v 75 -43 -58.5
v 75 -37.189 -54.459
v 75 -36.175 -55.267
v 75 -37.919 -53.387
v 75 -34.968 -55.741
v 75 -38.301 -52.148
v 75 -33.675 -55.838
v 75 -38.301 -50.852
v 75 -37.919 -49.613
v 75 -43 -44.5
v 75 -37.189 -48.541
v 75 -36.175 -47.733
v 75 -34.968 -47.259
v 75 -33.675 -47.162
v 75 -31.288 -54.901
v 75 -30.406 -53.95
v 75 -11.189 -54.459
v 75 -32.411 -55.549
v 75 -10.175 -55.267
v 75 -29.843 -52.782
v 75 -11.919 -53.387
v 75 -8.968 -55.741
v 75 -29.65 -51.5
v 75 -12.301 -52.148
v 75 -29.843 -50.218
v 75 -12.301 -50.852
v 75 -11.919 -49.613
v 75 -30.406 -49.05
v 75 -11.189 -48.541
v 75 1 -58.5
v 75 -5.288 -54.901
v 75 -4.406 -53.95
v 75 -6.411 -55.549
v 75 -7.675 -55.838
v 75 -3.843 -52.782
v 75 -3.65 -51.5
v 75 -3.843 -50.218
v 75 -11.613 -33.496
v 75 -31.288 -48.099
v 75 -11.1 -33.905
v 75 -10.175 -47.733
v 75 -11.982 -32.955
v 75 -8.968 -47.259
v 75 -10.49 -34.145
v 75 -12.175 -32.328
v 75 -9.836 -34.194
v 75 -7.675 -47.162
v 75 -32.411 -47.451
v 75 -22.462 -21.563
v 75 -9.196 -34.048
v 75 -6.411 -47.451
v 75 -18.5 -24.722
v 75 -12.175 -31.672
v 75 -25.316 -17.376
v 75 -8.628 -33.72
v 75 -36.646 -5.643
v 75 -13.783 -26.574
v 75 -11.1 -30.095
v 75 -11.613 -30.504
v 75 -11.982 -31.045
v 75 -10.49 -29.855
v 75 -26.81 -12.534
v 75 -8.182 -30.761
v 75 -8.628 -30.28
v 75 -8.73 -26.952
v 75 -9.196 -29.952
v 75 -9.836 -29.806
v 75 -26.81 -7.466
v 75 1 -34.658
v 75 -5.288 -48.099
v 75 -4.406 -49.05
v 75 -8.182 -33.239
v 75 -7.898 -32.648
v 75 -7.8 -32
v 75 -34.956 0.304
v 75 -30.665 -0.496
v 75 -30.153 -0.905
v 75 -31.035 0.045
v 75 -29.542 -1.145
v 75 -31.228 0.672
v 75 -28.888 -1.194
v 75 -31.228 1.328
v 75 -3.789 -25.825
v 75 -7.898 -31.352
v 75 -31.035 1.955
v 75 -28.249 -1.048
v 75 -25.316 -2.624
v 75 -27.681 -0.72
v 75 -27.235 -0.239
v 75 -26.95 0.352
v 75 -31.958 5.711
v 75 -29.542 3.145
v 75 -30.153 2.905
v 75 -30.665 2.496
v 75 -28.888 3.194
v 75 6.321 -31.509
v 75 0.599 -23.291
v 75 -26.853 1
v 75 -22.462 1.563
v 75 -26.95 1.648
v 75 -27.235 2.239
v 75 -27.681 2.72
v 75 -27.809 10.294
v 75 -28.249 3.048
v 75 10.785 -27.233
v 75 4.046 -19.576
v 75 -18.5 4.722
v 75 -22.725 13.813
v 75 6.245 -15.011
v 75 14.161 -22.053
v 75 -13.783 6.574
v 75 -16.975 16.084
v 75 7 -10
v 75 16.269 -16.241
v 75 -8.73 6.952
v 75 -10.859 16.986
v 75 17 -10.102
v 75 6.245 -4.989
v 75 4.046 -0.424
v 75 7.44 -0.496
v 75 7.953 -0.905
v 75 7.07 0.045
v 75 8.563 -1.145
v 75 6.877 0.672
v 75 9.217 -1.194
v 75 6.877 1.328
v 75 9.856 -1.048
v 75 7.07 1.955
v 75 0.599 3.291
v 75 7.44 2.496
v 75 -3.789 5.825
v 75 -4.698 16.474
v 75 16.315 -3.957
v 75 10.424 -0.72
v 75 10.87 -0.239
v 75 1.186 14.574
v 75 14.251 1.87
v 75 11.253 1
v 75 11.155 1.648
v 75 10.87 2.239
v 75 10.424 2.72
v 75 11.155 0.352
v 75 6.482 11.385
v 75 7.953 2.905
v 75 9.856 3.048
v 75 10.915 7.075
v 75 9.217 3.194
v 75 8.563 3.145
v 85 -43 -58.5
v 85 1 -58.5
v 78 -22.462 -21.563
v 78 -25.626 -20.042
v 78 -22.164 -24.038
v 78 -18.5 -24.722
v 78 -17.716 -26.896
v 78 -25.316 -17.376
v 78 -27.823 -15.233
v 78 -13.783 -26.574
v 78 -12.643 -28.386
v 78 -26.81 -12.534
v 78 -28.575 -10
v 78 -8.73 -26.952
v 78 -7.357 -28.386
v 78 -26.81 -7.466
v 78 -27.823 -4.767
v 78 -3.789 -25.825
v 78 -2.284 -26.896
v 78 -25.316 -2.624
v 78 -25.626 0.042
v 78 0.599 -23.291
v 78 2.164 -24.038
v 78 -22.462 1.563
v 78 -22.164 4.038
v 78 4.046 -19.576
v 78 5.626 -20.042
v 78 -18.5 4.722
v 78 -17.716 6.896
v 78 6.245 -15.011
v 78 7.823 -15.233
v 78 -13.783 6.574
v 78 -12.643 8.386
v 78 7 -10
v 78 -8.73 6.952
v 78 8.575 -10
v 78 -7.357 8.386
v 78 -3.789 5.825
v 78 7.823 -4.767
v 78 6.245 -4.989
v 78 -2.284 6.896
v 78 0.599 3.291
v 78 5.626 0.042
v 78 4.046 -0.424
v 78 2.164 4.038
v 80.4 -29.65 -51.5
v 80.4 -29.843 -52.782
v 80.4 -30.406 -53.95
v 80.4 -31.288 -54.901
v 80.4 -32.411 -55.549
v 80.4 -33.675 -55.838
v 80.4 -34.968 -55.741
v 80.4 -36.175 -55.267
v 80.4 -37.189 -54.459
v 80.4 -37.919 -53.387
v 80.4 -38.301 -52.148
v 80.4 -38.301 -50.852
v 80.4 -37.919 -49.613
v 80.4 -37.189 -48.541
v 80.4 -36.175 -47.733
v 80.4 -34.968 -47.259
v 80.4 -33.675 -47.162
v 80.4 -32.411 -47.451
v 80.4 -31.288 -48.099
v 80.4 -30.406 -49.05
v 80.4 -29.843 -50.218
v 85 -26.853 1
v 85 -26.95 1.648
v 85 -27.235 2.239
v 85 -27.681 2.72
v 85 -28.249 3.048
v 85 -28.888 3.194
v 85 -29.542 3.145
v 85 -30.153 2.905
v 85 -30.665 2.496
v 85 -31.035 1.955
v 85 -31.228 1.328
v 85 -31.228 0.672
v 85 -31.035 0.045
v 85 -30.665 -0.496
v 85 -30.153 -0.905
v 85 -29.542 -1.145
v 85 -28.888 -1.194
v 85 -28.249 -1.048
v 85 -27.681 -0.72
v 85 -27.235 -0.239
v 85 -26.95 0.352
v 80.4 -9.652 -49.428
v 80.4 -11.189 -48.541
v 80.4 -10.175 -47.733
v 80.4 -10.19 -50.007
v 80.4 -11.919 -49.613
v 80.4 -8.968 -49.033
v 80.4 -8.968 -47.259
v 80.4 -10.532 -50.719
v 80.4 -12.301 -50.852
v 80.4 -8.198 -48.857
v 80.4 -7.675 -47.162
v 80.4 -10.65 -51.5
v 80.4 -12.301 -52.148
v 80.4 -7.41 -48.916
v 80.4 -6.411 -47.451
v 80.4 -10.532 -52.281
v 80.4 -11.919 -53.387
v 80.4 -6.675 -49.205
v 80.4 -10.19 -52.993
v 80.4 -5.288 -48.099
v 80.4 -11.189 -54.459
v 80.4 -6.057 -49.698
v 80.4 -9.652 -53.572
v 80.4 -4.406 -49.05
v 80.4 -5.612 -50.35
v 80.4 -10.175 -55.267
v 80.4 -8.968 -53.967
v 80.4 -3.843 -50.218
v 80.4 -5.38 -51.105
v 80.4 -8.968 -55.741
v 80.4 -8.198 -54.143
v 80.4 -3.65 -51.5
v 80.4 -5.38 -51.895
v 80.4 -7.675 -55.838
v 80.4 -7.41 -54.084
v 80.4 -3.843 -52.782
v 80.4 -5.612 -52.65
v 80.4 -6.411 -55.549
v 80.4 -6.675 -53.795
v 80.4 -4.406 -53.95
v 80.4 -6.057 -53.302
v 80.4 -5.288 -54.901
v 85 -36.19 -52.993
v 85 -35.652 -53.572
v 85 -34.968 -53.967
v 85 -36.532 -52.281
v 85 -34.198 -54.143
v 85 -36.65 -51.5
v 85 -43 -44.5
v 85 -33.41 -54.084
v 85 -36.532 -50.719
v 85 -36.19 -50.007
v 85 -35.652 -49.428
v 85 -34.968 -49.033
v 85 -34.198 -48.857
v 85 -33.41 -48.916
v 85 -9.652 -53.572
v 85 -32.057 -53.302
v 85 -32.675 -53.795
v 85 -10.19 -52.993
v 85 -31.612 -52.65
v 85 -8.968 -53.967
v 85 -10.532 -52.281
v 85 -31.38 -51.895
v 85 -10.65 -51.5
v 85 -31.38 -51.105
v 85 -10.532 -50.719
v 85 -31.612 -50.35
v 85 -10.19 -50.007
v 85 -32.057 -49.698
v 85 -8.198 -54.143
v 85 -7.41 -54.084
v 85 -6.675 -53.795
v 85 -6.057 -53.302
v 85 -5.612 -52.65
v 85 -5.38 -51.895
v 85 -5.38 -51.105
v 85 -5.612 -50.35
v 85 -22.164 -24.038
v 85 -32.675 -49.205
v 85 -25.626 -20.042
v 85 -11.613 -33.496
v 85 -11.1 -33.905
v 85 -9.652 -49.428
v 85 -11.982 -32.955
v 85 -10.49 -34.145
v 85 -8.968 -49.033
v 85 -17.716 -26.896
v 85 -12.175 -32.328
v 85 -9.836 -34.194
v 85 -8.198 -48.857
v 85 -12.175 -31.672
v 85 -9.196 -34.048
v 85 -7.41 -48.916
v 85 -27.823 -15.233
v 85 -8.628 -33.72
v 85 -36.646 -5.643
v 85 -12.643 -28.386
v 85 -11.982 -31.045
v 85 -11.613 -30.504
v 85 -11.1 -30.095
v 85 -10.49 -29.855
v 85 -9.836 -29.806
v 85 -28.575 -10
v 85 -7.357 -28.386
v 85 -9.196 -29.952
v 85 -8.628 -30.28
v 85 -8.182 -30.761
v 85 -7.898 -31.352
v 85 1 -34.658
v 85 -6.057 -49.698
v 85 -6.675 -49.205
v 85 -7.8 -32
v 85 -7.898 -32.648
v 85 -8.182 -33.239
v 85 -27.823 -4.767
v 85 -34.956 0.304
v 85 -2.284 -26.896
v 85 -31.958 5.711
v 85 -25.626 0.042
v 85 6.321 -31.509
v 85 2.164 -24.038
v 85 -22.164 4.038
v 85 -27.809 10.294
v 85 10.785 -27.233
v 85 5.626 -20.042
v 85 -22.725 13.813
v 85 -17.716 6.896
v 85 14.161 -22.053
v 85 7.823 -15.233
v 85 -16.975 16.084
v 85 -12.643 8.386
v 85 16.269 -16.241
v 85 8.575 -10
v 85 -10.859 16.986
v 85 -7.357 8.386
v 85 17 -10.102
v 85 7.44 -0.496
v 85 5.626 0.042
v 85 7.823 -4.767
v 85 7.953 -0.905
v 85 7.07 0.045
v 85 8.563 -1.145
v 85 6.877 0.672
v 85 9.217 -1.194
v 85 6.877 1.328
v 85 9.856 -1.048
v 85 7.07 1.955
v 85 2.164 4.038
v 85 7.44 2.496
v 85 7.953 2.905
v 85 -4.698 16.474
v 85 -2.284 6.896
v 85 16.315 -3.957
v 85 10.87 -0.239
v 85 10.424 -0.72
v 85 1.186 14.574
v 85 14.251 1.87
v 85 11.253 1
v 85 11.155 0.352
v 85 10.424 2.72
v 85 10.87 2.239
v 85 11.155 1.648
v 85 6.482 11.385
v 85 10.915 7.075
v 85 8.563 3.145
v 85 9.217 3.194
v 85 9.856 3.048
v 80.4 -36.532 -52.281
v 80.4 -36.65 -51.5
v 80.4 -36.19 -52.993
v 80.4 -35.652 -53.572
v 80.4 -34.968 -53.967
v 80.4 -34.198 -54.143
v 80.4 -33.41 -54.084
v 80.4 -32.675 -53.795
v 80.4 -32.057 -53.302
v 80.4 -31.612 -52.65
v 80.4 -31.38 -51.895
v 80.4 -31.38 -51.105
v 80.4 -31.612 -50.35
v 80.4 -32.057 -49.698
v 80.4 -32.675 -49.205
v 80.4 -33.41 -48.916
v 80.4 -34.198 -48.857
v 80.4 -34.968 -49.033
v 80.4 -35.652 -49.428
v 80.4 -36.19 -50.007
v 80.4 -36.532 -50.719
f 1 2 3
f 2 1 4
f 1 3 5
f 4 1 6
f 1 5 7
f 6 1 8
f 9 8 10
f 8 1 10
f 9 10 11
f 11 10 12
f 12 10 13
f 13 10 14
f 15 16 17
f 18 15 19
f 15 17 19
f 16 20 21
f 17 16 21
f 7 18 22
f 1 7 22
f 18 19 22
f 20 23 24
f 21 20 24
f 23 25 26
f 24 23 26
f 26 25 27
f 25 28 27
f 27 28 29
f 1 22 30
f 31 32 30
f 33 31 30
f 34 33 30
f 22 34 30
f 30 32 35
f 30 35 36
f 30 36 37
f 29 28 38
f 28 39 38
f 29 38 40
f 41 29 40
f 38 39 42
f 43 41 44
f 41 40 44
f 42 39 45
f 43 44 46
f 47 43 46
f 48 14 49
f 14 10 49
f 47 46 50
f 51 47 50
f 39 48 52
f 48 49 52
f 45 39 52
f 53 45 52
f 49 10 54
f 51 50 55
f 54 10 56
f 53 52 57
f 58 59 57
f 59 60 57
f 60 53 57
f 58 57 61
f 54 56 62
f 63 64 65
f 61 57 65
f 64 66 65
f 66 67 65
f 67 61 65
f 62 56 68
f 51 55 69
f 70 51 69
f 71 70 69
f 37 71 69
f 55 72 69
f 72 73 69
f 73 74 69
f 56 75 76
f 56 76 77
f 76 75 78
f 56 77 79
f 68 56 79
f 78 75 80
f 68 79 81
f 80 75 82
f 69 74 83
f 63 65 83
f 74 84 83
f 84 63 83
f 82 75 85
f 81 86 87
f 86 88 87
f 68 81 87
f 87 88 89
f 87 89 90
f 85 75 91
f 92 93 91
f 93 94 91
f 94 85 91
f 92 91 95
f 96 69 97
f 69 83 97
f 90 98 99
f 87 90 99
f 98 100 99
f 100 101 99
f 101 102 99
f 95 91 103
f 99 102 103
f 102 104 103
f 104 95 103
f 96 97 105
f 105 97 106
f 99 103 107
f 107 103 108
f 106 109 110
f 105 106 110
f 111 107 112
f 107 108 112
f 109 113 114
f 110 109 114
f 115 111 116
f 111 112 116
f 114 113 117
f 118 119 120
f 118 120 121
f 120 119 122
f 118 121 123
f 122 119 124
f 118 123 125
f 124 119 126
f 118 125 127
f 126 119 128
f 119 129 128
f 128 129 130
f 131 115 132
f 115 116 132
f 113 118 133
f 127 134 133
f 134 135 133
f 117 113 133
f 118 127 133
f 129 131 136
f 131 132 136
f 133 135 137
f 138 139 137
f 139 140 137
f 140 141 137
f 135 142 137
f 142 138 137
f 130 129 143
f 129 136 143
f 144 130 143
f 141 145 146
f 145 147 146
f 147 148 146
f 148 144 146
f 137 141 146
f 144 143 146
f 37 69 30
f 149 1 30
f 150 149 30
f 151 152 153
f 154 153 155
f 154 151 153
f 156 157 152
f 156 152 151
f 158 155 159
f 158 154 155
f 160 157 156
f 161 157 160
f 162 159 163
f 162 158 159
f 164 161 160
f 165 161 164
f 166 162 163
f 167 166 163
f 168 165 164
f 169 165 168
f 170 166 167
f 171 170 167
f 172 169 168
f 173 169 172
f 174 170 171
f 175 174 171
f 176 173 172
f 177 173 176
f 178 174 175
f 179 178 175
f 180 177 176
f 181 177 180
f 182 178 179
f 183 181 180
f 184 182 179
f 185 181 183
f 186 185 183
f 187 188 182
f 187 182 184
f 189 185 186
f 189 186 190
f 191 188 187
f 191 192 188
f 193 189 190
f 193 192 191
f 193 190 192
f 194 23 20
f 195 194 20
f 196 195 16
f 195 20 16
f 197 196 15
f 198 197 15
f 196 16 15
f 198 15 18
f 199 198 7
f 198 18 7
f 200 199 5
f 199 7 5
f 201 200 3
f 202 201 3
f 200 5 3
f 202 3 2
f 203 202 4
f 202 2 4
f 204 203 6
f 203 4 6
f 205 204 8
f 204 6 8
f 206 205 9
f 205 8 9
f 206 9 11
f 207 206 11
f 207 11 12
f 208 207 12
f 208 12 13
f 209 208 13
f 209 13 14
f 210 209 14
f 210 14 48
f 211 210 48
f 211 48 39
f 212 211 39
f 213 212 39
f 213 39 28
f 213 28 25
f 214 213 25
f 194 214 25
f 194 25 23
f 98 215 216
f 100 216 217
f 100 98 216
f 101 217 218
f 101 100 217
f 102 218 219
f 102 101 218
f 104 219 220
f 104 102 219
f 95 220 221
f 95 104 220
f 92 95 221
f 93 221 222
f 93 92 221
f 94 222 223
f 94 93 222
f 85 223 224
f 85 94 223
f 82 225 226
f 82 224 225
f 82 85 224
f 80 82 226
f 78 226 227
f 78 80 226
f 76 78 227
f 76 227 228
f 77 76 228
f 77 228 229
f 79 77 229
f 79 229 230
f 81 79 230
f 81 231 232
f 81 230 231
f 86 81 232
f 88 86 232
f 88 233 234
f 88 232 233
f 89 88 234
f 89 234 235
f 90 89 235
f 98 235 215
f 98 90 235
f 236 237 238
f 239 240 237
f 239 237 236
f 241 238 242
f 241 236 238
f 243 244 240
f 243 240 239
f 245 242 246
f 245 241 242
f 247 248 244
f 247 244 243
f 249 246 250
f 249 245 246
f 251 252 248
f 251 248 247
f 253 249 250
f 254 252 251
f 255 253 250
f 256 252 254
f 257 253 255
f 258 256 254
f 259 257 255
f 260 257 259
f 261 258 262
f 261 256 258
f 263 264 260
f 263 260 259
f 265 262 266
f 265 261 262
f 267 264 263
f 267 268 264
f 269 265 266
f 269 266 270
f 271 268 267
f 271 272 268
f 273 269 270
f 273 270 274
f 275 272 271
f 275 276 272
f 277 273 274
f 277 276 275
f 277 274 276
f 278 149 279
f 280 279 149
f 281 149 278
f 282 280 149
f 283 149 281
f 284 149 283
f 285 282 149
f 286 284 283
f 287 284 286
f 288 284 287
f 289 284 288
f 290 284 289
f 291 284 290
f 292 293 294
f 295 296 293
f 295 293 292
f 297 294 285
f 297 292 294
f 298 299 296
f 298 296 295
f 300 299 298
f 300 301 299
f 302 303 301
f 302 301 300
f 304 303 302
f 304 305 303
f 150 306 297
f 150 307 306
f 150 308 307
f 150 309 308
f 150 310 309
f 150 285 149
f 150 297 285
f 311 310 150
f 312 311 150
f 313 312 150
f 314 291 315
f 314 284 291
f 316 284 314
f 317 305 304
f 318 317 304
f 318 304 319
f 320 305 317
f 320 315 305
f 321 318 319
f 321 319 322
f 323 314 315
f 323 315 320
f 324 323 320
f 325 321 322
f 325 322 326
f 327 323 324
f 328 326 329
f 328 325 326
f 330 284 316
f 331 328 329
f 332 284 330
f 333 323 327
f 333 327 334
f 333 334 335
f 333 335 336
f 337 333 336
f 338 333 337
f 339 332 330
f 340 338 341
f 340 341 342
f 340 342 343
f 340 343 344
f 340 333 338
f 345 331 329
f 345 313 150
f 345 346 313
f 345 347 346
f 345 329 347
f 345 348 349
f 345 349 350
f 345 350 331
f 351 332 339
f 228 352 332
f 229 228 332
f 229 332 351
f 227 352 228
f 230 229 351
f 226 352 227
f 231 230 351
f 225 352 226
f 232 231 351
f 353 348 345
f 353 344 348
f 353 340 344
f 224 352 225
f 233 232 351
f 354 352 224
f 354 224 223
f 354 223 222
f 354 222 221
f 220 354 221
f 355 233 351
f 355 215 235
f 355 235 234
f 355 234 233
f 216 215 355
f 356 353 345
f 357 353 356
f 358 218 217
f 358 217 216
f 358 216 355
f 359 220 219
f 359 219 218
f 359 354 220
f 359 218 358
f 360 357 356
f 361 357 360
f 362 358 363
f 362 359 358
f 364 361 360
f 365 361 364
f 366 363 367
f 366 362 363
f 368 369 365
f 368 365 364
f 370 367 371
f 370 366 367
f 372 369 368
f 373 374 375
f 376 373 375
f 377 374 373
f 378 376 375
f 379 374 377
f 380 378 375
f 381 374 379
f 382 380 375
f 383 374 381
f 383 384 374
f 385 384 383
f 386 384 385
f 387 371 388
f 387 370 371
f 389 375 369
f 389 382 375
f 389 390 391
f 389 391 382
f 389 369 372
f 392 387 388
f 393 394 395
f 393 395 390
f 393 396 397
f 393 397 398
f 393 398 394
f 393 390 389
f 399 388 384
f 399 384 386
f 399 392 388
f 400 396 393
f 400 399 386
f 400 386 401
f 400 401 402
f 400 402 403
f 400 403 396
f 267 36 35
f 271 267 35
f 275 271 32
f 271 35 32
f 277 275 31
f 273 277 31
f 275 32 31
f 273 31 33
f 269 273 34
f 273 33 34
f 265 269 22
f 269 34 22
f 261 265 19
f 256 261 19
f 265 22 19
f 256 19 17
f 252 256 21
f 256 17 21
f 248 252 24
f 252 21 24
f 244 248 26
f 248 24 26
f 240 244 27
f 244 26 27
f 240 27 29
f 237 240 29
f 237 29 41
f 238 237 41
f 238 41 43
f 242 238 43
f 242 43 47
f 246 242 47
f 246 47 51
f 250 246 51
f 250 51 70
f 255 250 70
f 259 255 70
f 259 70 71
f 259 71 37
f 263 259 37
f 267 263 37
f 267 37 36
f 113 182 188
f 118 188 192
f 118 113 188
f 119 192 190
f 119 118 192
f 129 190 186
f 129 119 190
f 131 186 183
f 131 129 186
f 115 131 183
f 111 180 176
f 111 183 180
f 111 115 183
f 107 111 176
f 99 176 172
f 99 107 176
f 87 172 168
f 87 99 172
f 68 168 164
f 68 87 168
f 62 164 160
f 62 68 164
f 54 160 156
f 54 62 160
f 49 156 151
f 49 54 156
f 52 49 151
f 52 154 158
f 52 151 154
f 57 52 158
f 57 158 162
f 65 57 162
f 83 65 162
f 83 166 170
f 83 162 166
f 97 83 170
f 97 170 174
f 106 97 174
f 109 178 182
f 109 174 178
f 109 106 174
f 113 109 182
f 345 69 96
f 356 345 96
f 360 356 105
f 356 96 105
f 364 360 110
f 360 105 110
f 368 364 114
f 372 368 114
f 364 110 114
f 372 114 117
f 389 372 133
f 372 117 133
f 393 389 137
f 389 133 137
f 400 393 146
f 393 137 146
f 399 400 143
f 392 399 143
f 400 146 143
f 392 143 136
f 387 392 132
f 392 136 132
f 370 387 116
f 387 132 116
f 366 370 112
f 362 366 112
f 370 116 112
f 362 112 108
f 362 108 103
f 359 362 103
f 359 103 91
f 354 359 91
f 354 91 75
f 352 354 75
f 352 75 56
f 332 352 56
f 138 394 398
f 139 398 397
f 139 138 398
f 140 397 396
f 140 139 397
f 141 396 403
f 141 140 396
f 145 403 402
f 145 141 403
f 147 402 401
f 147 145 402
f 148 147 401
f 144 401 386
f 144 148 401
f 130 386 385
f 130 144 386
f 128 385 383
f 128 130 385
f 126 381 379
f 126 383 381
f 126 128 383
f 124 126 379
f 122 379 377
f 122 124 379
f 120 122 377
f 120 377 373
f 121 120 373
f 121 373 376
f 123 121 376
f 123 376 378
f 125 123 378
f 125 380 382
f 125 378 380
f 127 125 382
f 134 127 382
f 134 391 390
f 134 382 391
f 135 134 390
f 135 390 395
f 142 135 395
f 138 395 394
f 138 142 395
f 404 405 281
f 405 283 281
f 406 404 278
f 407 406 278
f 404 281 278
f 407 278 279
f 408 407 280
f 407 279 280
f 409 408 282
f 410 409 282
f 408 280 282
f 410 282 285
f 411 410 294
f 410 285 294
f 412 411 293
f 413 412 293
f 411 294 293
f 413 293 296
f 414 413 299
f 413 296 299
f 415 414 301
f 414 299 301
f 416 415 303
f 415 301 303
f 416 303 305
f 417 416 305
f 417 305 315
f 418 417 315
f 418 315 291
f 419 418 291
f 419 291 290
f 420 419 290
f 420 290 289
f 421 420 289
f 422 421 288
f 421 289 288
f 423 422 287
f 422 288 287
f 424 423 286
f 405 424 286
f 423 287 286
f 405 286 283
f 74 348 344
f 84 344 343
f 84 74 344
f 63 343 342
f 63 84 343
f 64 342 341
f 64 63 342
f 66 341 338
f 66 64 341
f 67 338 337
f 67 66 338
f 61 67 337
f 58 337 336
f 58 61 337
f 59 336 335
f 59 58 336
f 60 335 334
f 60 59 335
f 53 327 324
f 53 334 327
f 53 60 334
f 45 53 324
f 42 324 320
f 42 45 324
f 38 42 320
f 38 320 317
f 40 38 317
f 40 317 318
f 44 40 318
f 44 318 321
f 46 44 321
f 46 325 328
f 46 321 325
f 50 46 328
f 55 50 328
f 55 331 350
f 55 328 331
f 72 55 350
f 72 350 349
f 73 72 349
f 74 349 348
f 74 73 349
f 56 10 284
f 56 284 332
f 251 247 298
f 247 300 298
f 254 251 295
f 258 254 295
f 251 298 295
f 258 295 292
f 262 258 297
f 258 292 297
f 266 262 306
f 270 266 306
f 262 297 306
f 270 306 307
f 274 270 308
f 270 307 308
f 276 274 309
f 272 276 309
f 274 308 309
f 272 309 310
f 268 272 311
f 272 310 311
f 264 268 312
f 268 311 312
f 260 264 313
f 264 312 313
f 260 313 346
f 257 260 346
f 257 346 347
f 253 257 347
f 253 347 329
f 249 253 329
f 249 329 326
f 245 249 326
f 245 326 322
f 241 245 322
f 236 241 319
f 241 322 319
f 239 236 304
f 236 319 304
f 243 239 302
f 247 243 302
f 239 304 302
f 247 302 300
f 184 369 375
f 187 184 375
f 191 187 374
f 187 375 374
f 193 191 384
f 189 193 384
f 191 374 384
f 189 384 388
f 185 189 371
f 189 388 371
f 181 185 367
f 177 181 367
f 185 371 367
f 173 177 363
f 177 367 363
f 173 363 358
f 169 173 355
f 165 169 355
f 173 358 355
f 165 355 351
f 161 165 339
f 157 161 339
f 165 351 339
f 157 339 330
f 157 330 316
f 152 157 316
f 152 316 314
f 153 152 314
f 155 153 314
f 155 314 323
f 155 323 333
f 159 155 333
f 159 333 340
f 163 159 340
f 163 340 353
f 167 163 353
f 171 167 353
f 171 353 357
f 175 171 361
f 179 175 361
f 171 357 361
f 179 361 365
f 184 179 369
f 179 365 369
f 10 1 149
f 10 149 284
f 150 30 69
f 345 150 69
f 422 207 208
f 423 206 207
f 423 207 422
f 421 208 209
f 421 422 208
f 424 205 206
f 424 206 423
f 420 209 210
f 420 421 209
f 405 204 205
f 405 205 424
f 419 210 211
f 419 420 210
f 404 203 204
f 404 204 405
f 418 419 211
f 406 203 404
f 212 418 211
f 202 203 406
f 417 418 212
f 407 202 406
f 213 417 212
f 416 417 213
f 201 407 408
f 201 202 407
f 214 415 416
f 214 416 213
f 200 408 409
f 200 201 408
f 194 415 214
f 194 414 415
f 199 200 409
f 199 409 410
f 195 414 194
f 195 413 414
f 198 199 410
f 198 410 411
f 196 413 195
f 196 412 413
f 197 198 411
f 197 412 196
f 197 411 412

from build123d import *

# Parameters (mm, degrees)
SKETCH049_R         = 17
PAD030_DEPTH        = 10
SKETCH066_R         = 18.575
POCKET019_DEPTH     = 7
HOLE005_D           = 5.3
HOLE005_DEPTH       = 25
HOLE005_CBORE_D     = 8.7
HOLE005_CBORE_DEPTH = 5.4
SKETCH061_R         = 2.2
POCKET021_DEPTH     = 10.001


with BuildPart() as part:
    # Sketch049 → Pad030 (new body)
    with BuildSketch(Plane.YZ.offset(81)):
        with BuildLine():
            ThreePointArc((1, -34.657656), (6.482261, 11.385394), (-36.646111, -5.64285))
            Line((-43, -44.5), (-36.646111, -5.64285))
            Line((-43, -58.5), (-43, -44.5))
            Line((-43, -58.5), (1, -58.5))
            Line((1, -58.5), (1, -34.657656))
        make_face()
        with Locations((-10, -10)):
            Circle(SKETCH049_R, mode=Mode.SUBTRACT)
    extrude(amount=PAD030_DEPTH)

    # Sketch066 → Pocket019 (cut)
    with BuildSketch(Plane.YZ.offset(91)):
        with Locations((-10, -10)):
            Circle(SKETCH066_R)
    extrude(amount=-POCKET019_DEPTH, mode=Mode.SUBTRACT)

    # Hole005
    with Locations(Plane(origin=(81, 0, 0), x_dir=(0, 1, 0), z_dir=(-1, 0, 0))):
        with Locations((-34, 51.5), (-8, 51.5)):
            CounterBoreHole(HOLE005_D / 2, HOLE005_CBORE_D / 2, HOLE005_CBORE_DEPTH, depth=HOLE005_DEPTH)

    # Sketch061 → Pocket021 (cut, through all)
    with BuildSketch(Plane.YZ.offset(81)):
        with Locations((-29.052559, 1)):
            Circle(SKETCH061_R)
        with Locations((9.052559, 1)):
            Circle(SKETCH061_R)
        with Locations((-10, -32)):
            Circle(SKETCH061_R)
    extrude(amount=POCKET021_DEPTH, mode=Mode.SUBTRACT)


with BuildPart() as part_1:
    # Body012 placement: moved
    add(part.part.moved(Location((-6, 0, 0))))


solid = part_1.part
